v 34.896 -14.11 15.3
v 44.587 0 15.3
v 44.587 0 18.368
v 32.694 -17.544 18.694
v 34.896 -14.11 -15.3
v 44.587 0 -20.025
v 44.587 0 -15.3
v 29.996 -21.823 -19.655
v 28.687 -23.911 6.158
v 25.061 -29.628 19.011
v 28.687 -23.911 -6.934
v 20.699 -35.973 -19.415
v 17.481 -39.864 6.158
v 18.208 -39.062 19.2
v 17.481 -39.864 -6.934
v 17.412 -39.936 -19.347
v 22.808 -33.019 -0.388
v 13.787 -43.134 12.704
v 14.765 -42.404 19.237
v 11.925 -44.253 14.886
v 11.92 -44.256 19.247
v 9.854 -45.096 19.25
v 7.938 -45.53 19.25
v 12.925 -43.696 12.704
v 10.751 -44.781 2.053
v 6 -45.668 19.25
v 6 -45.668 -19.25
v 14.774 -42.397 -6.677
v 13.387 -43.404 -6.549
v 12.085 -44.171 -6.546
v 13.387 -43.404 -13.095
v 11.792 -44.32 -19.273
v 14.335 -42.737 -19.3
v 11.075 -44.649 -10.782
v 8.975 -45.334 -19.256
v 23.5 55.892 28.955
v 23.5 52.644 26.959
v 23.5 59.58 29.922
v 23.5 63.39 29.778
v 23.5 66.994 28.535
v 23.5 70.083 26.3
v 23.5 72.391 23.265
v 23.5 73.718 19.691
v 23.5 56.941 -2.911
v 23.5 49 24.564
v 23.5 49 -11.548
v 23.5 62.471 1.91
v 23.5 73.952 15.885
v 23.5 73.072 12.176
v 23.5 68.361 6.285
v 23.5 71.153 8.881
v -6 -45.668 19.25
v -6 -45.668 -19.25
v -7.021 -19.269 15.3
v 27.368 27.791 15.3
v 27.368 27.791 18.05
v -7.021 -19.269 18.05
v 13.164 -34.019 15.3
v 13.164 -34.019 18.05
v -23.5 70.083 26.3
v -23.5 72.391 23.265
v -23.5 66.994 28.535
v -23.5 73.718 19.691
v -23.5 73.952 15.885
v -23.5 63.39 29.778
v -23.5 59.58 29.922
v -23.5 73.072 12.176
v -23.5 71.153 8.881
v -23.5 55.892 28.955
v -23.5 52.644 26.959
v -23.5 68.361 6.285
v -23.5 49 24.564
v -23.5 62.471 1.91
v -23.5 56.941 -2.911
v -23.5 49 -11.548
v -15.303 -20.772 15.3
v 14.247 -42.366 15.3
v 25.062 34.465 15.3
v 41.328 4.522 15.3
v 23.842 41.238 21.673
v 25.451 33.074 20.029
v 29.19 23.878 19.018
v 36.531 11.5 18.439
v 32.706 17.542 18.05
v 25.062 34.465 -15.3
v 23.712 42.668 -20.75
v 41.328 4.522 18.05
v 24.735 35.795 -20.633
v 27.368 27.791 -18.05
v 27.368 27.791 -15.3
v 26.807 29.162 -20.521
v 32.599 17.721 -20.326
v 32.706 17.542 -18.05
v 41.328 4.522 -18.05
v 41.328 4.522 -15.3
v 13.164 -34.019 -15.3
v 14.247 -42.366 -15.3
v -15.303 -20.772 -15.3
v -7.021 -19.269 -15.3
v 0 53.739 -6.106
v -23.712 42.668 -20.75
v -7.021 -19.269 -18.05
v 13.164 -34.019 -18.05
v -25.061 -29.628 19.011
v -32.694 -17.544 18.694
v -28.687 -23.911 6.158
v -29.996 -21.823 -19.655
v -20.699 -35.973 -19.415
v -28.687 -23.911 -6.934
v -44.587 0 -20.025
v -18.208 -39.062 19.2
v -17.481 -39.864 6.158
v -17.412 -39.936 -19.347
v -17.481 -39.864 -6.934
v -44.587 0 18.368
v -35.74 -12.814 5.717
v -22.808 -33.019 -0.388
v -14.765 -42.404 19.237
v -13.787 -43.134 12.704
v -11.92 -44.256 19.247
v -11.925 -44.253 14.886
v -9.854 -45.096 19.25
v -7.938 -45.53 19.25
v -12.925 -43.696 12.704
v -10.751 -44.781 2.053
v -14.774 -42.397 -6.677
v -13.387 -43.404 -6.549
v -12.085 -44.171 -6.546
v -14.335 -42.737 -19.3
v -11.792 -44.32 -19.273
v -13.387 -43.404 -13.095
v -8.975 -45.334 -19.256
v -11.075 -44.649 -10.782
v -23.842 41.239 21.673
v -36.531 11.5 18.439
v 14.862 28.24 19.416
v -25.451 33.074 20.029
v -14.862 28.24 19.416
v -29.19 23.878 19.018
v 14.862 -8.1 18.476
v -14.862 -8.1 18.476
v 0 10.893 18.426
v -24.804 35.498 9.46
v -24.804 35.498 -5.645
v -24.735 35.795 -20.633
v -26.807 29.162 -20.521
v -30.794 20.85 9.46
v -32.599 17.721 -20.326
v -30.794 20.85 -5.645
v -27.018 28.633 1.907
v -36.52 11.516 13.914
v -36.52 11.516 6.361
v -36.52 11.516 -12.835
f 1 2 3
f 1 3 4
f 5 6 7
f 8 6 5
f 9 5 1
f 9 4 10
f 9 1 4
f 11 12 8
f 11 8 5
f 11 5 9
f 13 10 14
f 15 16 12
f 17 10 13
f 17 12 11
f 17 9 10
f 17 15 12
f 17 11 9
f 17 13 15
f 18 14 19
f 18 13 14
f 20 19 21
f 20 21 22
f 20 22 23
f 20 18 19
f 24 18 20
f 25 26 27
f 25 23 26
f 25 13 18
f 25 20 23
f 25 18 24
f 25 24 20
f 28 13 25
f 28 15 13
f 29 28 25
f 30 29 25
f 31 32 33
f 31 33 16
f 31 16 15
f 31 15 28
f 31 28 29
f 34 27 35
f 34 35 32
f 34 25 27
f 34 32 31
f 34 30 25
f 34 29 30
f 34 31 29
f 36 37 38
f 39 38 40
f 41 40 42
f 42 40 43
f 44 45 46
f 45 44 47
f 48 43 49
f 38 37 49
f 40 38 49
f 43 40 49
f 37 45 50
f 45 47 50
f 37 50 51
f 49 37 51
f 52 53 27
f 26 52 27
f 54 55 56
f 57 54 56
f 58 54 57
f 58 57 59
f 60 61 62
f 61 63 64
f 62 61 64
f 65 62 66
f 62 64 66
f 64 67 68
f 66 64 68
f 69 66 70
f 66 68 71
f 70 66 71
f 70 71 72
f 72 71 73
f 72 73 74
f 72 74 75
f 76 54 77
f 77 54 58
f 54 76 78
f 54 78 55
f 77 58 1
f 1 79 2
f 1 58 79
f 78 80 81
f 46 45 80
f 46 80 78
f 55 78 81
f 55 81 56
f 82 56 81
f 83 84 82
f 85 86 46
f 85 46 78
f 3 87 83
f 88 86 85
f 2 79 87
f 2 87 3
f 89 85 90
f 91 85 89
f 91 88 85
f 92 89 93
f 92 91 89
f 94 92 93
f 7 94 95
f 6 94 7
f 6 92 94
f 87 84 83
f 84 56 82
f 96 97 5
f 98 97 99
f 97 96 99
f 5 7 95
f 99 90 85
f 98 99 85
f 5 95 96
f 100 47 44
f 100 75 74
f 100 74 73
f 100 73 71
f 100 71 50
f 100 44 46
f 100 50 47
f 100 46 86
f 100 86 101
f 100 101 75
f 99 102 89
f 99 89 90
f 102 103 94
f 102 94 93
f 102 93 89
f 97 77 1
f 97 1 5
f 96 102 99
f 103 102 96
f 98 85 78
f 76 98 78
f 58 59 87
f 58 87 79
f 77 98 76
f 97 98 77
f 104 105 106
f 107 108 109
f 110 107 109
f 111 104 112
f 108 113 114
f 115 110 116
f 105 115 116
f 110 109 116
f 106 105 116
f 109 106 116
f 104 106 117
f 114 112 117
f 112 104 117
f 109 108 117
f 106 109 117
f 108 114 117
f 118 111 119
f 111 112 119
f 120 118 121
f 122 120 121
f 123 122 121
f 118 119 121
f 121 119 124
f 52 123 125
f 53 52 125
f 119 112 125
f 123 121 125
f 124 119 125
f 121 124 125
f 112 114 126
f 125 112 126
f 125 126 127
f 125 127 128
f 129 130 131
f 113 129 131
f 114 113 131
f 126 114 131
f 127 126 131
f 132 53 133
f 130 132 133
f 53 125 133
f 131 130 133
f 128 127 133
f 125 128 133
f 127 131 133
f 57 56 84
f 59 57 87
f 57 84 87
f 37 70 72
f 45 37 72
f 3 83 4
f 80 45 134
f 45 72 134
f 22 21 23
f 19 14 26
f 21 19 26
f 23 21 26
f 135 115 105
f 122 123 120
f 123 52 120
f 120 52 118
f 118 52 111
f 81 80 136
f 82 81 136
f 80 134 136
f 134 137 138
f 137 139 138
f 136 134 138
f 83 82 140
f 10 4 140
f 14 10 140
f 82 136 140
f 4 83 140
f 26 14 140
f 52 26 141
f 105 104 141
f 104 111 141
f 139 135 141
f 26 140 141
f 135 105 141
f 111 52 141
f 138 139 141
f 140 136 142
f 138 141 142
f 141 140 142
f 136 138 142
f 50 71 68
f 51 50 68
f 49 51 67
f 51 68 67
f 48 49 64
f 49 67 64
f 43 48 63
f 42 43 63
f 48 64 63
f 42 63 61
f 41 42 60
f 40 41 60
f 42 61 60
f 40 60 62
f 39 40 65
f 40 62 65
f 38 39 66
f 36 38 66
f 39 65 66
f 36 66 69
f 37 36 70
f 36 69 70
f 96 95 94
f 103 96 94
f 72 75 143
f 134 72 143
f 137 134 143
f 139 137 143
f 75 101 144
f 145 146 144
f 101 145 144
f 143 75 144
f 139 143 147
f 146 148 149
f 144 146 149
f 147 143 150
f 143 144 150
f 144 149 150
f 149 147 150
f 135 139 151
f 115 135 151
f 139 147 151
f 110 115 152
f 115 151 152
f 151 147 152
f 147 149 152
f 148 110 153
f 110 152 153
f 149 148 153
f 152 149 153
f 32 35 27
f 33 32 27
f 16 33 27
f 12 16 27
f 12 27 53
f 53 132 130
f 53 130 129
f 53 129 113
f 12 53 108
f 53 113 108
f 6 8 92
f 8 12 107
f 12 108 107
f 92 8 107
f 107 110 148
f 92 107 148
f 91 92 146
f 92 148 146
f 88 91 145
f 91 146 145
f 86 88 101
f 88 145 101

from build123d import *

# Parameters (mm, degrees)
BOSS_EXTRUDE1_DEPTH      = 70
BOSS_EXTRUDE1_DEPTH_BACK = 90
CUT_EXTRUDE1_DEPTH       = 125.755860093
CUT_EXTRUDE1_DEPTH_BACK  = 125.755860093
SKETCH10_OUTSIDE_W       = 205.76
SKETCH10_OUTSIDE_H       = 165.428
CUT_EXTRUDE4_DEPTH       = 6.4
CUT_EXTRUDE4_DEPTH_BACK  = 105.067072527
SKETCH15_W               = 36.6
SKETCH15_H               = 30.6
CUT_EXTRUDE5_DEPTH       = 12.5


with BuildPart() as part:
    # Sketch8 → Boss-Extrude1 (new, two sides: drawn at the far end of the back side and taken through both)
    with BuildSketch(Plane.XY.offset(-BOSS_EXTRUDE1_DEPTH_BACK)):
        with BuildLine():
            Line((-6, -45.667592609), (6, -45.667592609))
            add(Edge.make_bspline(
                [(44.587269323, 0), (24.684424598, -27.160649005), (19.273508518, -45.667592609), (6, -45.667592609)],
                knots=[0, 0, 0, 0, 1, 1, 1, 1], degree=3))
            add(Edge.make_bspline(
                [(23.5, 49), (23.5, 34.38564976), (25.853420885, 25.6357926), (44.587269323, 0)],
                knots=[0, 0, 0, 0, 1, 1, 1, 1], degree=3))
            Line((23.5, 49), (23.5, 74))
            Line((23.5, 74), (-23.5, 74))
            Line((-23.5, 74), (-23.5, 49))
            add(Edge.make_bspline(
                [(-23.5, 49), (-23.5, 34.38564976), (-25.853420885, 25.6357926), (-44.587269323, 0)],
                knots=[0, 0, 0, 0, 1, 1, 1, 1], degree=3))
            add(Edge.make_bspline(
                [(-44.587269323, 0), (-24.684424598, -27.160649005), (-19.273508518, -45.667592609), (-6, -45.667592609)],
                knots=[0, 0, 0, 0, 1, 1, 1, 1], degree=3))
        make_face()
    extrude(amount=BOSS_EXTRUDE1_DEPTH + BOSS_EXTRUDE1_DEPTH_BACK)

    # Sketch10 outside → Cut-Extrude1 (cut, two sides: drawn at the far end of the back side and taken through both)
    with BuildSketch(Plane(origin=(0, 0, 0), x_dir=(0, 0, -1), z_dir=(1, 0, 0)).offset(-CUT_EXTRUDE1_DEPTH_BACK)):
        with Locations((10, 14.166)):
            Rectangle(SKETCH10_OUTSIDE_W, SKETCH10_OUTSIDE_H)
        with BuildLine():
            Line((19.25, -45.667592609), (20.75, 42.667592609))
            add(Edge.make_bspline(
                [(-6.284762028, 68.360956134), (4.979548326, 51.963661564), (20.75, 42.667592609)],
                knots=[0, 0, 0, 1, 1, 1], degree=2))
            ThreePointArc((-6.284762028, 68.360956134), (-24.867699079, 71.348879707), (-26.958577761, 52.643761074))
            add(Edge.make_bspline(
                [(-26.958577761, 52.643761074), (-14.483902489, 37.777022003), (-19.25, -11.054872301), (-19.25, -45.667592609)],
                knots=[0, 0, 0, 0, 1, 1, 1, 1], degree=3))
            Line((-19.25, -45.667592609), (19.25, -45.667592609))
        make_face(mode=Mode.SUBTRACT)
    extrude(amount=CUT_EXTRUDE1_DEPTH + CUT_EXTRUDE1_DEPTH_BACK, mode=Mode.SUBTRACT)

    # l_hip_x_top_room → Cut-Extrude4 (cut, two sides: drawn at the far end of the back side and taken through both)
    with BuildSketch(Plane(origin=(-7.847220638, -10.738301926, 0), x_dir=(-0.807391122257892, 0.5900165893423182, 0), z_dir=(-0.5900165893423182, -0.807391122257892, 0)).offset(-CUT_EXTRUDE4_DEPTH_BACK)):
        Polygon((-5.7, 15.3), (0.1, 15.3), (0.1, -15.3), (-5.7, -15.3), (-5.7, -18.05), (-30.7, -18.05), (-30.7, -15.3), (-36.5, -15.3), (-36.5, 15.3), (-30.7, 15.3), (-30.7, 18.05), (-5.7, 18.05), align=None)
    extrude(amount=CUT_EXTRUDE4_DEPTH + CUT_EXTRUDE4_DEPTH_BACK, mode=Mode.SUBTRACT)

    # Sketch15 → Cut-Extrude5 (cut)
    with BuildSketch(Plane(origin=(-7.847220638, -10.738301926, 0), x_dir=(0.807391122257892, -0.5900165893423182, 0), z_dir=(0.5900165893423182, 0.807391122257892, 0))):
        with Locations((18.2, 0)):
            Rectangle(SKETCH15_W, SKETCH15_H)
    extrude(amount=-CUT_EXTRUDE5_DEPTH, mode=Mode.SUBTRACT)


solid = part.part
